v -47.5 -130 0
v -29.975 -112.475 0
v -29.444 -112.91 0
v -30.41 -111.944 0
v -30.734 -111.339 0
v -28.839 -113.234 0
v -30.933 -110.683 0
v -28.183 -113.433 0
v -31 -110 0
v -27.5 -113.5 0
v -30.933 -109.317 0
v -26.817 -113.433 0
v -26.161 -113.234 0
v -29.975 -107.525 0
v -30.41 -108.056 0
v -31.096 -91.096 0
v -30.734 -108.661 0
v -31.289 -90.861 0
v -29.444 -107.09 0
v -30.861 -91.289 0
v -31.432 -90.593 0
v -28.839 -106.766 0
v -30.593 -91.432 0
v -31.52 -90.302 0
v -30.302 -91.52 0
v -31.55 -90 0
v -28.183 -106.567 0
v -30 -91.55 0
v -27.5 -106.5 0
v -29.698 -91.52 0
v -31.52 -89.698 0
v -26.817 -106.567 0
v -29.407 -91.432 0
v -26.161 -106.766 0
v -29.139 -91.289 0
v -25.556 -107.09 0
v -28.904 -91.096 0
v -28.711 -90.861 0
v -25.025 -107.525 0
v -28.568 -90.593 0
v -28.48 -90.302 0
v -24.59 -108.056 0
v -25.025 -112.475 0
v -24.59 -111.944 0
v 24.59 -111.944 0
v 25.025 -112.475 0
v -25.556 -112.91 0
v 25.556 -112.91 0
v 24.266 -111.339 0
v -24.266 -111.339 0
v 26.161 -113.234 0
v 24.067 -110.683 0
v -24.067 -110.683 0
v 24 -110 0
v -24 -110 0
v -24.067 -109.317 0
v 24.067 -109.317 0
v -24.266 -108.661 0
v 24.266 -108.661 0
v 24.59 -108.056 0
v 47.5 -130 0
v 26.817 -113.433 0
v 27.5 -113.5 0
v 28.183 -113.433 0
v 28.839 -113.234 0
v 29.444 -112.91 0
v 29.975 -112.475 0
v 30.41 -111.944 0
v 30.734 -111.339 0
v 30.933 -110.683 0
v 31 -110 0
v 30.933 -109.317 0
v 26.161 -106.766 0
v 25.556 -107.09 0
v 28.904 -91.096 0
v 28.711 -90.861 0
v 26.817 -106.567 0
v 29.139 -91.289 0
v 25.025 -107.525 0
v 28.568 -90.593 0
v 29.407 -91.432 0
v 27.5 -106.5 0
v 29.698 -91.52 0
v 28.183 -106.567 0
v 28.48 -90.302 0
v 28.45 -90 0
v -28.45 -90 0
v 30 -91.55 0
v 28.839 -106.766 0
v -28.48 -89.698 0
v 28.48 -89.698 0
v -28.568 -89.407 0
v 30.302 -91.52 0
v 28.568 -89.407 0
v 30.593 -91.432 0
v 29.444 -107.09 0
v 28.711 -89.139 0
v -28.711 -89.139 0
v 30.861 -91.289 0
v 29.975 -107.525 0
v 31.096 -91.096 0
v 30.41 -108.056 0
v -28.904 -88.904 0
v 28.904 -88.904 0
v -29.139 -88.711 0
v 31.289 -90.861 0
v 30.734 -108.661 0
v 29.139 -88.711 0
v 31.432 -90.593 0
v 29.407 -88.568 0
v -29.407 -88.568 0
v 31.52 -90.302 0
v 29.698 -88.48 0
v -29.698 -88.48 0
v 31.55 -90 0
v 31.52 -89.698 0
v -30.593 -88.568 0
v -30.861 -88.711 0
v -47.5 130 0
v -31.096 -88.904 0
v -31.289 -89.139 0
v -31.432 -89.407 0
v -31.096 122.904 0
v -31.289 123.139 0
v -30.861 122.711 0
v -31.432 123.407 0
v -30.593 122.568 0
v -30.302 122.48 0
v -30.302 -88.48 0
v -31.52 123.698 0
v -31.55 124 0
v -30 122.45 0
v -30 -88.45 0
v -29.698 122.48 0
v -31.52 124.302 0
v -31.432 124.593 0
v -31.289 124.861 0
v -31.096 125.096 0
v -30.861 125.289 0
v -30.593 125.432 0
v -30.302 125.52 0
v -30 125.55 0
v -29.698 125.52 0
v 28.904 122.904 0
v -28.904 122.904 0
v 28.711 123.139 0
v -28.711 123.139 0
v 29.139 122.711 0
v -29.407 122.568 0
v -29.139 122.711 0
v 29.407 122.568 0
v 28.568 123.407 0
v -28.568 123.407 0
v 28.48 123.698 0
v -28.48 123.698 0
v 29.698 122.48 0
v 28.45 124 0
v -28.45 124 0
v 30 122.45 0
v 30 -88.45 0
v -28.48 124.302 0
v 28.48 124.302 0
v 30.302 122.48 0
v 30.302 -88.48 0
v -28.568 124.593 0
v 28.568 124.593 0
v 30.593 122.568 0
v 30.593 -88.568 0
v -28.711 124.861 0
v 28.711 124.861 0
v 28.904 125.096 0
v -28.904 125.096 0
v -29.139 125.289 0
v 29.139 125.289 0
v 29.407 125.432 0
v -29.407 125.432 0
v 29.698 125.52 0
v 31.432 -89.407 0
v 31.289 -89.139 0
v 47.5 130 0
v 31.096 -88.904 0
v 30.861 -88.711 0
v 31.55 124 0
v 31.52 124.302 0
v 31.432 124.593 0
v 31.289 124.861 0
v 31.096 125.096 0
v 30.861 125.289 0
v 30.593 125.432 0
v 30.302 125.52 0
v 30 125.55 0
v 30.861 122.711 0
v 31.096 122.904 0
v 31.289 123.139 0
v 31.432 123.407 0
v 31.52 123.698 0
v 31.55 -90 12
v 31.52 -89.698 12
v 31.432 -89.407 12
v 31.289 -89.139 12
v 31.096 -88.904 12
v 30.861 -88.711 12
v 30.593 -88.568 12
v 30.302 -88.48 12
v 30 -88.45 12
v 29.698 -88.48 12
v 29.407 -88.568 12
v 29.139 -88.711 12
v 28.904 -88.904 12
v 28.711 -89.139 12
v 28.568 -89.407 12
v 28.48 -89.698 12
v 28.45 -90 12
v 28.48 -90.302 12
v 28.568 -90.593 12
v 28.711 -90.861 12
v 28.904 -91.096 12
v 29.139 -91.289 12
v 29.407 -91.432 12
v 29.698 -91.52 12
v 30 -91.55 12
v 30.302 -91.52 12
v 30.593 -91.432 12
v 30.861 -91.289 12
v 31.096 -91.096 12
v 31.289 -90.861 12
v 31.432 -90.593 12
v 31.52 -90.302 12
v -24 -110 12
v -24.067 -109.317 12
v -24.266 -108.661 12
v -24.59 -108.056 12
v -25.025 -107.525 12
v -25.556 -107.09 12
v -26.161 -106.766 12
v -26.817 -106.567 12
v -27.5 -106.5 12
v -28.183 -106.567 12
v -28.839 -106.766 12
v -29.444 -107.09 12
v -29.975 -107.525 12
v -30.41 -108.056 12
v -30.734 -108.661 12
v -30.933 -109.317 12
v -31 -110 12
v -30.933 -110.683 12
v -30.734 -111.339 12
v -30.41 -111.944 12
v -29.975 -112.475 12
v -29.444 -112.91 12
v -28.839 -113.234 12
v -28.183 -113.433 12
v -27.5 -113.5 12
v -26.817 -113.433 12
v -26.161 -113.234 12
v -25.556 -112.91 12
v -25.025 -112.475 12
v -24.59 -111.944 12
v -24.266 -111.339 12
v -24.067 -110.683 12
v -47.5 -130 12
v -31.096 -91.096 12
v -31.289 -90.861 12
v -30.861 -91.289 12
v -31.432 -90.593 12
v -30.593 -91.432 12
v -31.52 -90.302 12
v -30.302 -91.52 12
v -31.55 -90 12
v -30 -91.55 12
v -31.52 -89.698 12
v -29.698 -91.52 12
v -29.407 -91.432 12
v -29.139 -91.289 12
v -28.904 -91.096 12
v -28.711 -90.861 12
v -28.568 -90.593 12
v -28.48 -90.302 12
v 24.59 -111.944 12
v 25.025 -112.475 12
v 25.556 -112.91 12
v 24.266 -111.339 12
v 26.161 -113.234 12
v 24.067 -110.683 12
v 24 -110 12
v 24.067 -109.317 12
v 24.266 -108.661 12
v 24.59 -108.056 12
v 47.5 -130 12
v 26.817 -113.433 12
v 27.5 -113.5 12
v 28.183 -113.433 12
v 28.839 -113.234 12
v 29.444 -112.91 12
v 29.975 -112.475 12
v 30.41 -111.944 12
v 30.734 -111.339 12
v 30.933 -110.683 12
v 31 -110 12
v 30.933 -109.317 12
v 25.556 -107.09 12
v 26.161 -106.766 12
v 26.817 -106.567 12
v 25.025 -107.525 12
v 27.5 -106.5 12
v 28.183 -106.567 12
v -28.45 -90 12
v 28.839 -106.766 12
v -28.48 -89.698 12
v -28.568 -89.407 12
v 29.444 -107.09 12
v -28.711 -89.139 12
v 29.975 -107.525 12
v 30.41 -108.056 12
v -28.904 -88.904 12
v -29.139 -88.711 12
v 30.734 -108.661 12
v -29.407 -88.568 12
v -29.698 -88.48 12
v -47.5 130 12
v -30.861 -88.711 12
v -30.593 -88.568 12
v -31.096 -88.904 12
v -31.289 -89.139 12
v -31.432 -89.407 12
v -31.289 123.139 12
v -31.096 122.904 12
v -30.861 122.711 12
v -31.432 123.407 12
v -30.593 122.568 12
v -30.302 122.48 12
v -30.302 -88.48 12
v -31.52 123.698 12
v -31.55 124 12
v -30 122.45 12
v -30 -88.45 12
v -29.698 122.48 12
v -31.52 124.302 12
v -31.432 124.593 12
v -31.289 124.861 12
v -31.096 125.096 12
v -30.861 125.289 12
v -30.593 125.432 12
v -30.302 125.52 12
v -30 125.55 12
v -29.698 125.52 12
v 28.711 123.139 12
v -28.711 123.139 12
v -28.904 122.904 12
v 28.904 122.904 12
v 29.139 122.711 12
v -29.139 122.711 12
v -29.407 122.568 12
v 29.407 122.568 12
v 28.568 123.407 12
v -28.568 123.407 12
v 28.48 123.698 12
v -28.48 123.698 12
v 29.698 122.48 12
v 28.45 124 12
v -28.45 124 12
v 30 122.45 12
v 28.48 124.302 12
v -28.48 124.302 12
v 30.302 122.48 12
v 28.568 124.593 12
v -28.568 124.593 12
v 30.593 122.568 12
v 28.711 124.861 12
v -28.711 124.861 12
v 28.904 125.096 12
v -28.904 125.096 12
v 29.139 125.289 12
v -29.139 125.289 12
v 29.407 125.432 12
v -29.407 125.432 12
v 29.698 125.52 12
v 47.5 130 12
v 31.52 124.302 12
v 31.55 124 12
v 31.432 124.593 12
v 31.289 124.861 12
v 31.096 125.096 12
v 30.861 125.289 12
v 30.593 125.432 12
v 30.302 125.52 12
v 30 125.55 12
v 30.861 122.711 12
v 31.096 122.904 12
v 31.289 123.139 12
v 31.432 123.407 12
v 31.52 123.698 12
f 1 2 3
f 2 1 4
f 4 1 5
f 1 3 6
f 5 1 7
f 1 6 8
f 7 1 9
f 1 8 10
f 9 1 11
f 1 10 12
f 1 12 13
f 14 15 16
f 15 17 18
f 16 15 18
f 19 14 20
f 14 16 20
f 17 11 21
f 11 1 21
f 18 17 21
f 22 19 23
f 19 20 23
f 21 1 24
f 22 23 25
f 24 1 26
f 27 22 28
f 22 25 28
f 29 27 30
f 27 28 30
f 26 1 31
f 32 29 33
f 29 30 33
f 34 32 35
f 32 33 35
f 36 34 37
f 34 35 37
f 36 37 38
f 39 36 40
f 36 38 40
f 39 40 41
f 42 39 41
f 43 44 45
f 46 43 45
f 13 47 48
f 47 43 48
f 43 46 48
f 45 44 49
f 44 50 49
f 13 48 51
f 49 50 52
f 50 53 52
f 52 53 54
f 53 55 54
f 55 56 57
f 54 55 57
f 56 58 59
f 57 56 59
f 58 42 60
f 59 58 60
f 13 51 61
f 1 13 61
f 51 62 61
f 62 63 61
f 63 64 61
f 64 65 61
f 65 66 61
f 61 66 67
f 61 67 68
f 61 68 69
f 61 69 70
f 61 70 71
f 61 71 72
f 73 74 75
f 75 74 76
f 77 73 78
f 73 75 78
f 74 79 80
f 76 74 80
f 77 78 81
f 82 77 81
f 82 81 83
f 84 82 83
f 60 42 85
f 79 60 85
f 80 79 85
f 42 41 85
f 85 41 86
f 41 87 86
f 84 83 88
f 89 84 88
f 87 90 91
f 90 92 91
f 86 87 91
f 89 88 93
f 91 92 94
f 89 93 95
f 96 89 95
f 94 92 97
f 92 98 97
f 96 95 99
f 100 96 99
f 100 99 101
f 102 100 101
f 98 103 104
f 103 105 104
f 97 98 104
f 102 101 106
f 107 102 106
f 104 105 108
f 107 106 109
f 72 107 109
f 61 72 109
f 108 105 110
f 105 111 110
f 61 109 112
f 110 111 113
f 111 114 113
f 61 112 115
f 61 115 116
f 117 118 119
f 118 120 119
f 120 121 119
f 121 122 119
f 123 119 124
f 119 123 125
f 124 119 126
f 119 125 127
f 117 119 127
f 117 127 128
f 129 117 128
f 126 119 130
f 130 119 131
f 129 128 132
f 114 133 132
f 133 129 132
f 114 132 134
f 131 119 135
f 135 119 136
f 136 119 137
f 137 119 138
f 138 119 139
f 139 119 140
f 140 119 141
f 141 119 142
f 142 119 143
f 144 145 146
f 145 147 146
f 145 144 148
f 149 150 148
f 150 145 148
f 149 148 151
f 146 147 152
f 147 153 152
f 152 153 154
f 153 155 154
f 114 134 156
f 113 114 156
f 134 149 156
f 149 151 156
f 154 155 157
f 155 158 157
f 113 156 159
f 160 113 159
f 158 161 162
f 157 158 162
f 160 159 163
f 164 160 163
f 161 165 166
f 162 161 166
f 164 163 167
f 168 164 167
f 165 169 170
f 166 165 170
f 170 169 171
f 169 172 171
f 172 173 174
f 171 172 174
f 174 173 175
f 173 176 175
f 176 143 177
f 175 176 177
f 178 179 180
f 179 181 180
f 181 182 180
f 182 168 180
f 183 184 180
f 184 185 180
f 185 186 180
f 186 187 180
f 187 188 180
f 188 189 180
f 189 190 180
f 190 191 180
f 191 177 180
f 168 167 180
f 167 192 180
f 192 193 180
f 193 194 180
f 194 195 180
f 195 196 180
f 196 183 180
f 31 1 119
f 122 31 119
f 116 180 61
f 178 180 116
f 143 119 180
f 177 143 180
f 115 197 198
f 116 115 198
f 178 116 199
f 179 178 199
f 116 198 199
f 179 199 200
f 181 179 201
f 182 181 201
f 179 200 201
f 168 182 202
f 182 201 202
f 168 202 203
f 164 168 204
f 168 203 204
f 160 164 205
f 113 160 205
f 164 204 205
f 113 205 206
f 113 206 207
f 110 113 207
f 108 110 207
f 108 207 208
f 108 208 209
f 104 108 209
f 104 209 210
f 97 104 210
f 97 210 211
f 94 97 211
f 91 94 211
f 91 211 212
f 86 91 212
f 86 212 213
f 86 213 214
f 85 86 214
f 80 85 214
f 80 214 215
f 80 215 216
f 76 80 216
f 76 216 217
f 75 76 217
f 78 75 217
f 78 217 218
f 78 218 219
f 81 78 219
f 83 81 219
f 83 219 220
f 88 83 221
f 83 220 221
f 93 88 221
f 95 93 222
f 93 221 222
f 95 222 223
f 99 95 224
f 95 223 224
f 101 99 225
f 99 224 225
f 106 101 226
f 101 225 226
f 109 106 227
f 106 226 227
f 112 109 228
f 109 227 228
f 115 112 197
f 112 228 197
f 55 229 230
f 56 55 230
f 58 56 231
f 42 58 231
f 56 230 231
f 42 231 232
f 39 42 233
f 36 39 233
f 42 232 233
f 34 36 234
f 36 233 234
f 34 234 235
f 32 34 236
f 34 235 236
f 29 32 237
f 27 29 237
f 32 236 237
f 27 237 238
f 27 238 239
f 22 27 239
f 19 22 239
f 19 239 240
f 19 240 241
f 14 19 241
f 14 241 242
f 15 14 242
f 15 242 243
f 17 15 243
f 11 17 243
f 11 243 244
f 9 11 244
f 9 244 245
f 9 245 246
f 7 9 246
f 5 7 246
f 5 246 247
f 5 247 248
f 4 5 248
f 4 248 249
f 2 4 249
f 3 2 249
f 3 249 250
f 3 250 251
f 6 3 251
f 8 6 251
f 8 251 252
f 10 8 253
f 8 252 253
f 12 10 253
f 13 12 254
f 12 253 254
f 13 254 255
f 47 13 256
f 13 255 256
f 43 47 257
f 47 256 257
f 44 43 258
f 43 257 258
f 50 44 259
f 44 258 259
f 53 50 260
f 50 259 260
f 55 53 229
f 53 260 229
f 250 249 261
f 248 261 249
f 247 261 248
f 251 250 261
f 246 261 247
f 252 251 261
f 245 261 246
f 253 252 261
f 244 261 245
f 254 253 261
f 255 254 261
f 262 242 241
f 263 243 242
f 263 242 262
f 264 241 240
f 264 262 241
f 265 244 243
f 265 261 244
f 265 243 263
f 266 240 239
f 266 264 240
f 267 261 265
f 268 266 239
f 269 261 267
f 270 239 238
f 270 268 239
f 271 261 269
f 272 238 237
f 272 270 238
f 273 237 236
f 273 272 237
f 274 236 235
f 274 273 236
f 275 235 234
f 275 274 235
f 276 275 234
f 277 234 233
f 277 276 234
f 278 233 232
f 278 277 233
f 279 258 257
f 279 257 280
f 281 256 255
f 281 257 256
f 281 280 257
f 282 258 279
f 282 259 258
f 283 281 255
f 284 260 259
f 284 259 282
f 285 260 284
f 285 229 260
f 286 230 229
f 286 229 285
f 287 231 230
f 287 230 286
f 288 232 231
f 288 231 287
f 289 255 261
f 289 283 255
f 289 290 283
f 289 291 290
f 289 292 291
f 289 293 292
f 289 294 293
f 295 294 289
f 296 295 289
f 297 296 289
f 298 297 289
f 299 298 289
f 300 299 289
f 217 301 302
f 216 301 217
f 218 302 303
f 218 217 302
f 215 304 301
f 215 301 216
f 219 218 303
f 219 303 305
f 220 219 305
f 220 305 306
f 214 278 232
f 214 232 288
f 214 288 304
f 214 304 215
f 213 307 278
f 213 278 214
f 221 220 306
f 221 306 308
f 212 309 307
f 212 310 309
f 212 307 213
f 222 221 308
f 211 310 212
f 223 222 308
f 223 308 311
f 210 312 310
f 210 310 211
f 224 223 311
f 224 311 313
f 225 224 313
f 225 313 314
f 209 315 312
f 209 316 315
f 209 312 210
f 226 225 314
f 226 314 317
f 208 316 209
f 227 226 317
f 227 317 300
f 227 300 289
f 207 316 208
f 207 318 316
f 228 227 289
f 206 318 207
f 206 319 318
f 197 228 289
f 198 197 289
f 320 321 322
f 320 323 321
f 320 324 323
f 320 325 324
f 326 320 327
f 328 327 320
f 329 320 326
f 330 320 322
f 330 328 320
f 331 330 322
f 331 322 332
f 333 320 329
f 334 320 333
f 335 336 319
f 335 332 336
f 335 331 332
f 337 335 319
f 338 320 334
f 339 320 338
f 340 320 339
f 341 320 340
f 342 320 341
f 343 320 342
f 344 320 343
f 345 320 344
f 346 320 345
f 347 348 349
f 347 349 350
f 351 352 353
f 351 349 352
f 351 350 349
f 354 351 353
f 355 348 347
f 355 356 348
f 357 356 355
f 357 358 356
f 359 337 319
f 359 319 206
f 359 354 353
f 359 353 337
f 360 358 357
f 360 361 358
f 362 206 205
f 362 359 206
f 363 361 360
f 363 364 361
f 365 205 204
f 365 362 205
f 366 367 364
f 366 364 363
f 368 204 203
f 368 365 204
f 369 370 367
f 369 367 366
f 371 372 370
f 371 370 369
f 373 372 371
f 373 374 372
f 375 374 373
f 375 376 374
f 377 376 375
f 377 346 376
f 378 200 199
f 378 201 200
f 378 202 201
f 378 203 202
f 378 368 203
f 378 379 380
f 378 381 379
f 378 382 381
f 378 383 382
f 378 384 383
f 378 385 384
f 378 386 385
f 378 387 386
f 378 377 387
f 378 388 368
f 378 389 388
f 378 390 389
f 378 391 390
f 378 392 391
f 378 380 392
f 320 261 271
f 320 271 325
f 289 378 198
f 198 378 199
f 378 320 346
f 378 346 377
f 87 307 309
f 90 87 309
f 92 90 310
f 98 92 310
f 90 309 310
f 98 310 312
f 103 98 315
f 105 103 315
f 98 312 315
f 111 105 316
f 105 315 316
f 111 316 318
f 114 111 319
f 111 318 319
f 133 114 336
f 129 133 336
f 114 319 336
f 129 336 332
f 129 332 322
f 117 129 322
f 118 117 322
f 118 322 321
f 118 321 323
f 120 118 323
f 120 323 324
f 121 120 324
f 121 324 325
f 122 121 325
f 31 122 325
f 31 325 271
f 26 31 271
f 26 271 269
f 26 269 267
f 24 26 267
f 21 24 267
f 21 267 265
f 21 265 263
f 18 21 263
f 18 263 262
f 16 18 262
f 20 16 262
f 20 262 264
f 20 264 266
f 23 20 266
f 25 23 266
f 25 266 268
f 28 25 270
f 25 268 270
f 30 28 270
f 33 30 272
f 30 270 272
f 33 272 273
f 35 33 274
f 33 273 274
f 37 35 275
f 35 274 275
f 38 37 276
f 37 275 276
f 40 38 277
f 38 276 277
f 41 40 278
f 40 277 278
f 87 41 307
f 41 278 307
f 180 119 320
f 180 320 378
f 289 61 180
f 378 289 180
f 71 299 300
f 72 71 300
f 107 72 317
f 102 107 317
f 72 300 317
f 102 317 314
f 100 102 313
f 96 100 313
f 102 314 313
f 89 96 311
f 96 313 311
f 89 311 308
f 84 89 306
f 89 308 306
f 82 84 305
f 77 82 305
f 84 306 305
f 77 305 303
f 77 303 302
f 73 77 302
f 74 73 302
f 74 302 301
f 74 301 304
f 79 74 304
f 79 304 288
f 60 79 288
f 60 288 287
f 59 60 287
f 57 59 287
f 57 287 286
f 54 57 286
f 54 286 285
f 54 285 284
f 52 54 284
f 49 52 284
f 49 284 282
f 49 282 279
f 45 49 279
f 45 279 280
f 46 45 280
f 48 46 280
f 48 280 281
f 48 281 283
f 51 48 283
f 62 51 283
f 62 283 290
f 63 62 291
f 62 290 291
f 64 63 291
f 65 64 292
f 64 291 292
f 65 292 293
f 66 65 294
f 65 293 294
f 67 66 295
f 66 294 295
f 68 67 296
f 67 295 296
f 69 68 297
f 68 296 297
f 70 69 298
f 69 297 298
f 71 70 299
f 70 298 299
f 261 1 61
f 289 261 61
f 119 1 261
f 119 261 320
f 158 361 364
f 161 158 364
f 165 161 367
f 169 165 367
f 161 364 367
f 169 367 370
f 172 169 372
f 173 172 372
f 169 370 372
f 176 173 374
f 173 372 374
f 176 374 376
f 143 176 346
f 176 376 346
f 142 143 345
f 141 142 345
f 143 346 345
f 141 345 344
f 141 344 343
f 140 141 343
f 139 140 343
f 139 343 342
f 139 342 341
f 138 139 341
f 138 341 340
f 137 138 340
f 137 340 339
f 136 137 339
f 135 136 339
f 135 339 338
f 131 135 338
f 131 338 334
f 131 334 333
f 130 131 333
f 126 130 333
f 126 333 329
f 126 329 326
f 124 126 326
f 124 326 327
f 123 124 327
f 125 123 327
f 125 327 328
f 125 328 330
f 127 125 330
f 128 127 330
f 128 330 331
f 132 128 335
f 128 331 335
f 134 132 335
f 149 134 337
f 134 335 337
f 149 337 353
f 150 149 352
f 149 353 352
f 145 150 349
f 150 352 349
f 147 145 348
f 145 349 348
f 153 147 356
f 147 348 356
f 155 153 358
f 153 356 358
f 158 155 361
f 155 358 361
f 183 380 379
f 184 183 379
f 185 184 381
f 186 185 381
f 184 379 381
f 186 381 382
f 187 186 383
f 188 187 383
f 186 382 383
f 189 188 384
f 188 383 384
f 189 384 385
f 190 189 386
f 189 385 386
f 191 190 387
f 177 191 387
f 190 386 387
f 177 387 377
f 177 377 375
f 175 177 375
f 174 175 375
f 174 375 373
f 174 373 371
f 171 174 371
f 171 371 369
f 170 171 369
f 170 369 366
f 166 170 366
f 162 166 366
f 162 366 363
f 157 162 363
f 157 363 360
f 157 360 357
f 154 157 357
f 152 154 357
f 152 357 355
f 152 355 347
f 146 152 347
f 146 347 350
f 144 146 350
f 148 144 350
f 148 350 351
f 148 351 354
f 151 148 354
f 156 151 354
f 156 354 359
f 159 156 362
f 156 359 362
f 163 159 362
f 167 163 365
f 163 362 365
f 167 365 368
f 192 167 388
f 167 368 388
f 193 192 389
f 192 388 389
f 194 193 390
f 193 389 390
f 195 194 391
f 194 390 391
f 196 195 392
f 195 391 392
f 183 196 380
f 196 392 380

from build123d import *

# Parameters (mm, degrees)
SKETCH1_W           = 95
SKETCH1_H           = 260
BOSS_EXTRUDE1_DEPTH = 12
SKETCH3_R           = 3.5
CUT_EXTRUDE1_DEPTH  = 13
SKETCH4_R           = 1.55
CUT_EXTRUDE2_DEPTH  = 13


with BuildPart() as part:
    # Sketch1 → Boss-Extrude1 (new body)
    with BuildSketch(Plane.XY):
        Rectangle(SKETCH1_W, SKETCH1_H)
    extrude(amount=BOSS_EXTRUDE1_DEPTH)

    # Sketch3 → Cut-Extrude1 (cut, through all)
    with BuildSketch(Plane.XY.offset(12)):
        with Locations((-27.5, -110)):
            Circle(SKETCH3_R)
        with Locations((27.5, -110)):
            Circle(SKETCH3_R)
    extrude(amount=-CUT_EXTRUDE1_DEPTH, mode=Mode.SUBTRACT)

    # Sketch4 → Cut-Extrude2 (cut, through all)
    with BuildSketch(Plane.XY.offset(12)):
        with Locations((-30, -90)):
            Circle(SKETCH4_R)
        with Locations((30, -90)):
            Circle(SKETCH4_R)
        with Locations((30, 124)):
            Circle(SKETCH4_R)
        with Locations((-30, 124)):
            Circle(SKETCH4_R)
    extrude(amount=-CUT_EXTRUDE2_DEPTH, mode=Mode.SUBTRACT)


solid = part.part
